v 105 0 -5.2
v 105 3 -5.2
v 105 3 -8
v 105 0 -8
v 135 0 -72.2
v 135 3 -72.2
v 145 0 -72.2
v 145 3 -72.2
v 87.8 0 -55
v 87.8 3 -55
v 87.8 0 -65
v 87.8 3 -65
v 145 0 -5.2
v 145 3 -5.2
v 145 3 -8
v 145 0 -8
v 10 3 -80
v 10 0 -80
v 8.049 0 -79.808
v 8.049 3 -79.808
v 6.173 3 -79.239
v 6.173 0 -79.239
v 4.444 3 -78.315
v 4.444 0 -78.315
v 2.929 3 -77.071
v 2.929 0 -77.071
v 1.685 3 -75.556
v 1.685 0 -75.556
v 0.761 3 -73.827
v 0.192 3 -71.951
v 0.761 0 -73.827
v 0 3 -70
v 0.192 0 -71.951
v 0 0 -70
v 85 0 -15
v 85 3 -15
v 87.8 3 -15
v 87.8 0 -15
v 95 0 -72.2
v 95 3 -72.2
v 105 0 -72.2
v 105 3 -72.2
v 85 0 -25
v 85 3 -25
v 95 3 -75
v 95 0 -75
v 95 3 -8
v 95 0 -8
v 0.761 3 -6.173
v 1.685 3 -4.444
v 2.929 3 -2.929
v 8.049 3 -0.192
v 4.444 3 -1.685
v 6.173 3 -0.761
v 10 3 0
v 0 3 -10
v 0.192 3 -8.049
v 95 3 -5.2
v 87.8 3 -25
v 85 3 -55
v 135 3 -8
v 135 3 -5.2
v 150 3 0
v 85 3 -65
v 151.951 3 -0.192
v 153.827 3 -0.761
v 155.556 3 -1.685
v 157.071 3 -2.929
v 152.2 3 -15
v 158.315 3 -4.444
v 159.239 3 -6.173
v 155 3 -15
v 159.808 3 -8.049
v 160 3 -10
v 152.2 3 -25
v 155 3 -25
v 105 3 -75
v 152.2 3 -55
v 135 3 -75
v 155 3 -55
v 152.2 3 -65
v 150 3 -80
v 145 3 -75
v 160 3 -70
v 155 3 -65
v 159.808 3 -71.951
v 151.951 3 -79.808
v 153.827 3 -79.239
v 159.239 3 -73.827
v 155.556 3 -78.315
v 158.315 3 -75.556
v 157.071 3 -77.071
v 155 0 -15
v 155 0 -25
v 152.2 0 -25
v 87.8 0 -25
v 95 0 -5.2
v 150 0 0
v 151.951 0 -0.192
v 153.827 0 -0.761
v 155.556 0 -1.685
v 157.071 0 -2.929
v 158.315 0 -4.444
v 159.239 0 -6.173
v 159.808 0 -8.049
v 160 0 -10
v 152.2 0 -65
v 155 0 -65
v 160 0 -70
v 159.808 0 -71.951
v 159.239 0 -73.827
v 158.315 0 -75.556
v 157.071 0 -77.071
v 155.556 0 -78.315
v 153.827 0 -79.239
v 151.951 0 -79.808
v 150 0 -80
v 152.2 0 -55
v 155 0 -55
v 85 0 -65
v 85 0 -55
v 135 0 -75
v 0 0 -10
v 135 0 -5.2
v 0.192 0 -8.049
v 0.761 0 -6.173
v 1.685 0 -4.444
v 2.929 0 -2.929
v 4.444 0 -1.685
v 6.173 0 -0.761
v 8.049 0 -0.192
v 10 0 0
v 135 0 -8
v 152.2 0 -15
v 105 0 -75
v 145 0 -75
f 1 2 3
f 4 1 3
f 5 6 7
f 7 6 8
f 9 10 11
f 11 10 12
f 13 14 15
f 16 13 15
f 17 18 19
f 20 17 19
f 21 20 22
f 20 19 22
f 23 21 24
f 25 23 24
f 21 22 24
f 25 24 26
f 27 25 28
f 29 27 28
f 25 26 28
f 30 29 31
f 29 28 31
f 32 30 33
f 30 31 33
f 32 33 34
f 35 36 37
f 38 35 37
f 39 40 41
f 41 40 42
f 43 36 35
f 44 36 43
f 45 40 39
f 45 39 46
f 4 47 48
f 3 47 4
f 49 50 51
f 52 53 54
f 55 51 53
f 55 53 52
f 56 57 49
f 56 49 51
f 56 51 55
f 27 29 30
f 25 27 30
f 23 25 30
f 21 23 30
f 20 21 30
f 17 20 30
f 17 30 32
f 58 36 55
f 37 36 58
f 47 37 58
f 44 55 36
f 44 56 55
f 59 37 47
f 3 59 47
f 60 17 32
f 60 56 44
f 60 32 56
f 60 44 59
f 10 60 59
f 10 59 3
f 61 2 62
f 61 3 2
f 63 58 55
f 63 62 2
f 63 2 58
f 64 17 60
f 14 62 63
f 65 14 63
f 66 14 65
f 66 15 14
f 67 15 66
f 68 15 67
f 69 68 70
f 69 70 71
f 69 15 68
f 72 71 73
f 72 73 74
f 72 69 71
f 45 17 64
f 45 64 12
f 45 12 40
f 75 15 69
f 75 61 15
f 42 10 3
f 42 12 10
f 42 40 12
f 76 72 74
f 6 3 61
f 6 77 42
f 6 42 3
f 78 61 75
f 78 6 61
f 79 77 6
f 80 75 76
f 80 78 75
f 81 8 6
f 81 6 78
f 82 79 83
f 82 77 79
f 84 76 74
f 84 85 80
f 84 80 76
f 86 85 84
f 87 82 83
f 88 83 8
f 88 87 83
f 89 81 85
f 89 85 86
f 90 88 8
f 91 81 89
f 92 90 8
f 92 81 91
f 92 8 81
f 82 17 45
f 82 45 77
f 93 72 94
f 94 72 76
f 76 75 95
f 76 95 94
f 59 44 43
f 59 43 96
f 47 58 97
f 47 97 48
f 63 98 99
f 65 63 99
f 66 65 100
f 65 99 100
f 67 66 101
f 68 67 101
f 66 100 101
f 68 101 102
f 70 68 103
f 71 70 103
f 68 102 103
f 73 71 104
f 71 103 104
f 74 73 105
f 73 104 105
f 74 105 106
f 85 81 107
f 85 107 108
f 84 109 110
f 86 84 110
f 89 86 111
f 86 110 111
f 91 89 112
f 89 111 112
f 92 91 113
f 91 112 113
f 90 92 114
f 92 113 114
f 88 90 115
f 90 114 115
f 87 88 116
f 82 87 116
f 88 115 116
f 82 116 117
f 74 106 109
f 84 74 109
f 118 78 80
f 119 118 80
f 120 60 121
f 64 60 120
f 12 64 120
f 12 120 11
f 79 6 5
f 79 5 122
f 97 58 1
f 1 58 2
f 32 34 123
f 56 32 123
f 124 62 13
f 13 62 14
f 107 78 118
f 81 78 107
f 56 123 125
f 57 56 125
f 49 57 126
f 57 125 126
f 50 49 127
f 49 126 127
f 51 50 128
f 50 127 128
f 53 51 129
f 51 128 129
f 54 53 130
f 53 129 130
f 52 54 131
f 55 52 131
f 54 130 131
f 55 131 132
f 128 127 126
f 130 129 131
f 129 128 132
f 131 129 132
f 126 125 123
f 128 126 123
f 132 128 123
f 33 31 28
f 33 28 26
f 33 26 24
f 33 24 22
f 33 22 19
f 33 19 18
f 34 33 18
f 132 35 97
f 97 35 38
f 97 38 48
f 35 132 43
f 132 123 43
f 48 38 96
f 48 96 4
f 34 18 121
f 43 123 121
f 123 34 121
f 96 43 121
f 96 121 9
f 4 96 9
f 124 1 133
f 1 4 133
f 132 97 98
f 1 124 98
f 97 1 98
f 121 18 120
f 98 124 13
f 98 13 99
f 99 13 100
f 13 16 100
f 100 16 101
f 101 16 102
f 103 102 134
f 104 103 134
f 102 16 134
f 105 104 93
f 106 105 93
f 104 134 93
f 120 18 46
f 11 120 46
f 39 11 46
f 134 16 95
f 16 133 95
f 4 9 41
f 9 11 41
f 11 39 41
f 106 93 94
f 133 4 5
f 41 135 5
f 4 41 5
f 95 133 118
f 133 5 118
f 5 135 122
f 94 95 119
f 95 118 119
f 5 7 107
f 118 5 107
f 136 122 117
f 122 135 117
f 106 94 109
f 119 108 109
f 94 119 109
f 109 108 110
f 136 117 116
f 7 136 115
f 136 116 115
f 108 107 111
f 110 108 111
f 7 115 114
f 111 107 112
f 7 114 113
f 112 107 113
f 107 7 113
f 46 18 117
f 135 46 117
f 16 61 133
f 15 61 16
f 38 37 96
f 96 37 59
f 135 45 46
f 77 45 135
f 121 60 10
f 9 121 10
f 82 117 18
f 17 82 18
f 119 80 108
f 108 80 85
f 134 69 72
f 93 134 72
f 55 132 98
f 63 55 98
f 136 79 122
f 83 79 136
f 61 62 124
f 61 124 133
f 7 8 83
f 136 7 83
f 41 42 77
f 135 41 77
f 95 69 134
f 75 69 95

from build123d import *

# Parameters (mm, degrees)
BOSS_EXTRU_1_DEPTH      = 3
ESQUISSE4_W             = 10
ESQUISSE4_H             = 2.8
ENL_V_MAT_EXTRU_2_DEPTH = 179.910592196
ESQUISSE5_W             = 2.8
ESQUISSE5_H             = 10
ENL_V_MAT_EXTRU_3_DEPTH = 179.910592196


with BuildPart() as part:
    # Esquisse2 → Boss.-Extru.1 (new body)
    with BuildSketch(Plane(origin=(0, 0, 0), x_dir=(1, 0, 0), z_dir=(0, 1, 0))):
        with BuildLine():
            Line((10, 0), (150, 0))
            ThreePointArc((150, 0), (157.071067812, 2.928932188), (160, 10))
            Line((160, 10), (160, 70))
            ThreePointArc((160, 70), (157.071067812, 77.071067812), (150, 80))
            Line((150, 80), (10, 80))
            ThreePointArc((10, 80), (2.928932188, 77.071067812), (0, 70))
            Line((0, 70), (0, 10))
            ThreePointArc((0, 10), (2.928932188, 2.928932188), (10, 0))
        make_face()
    extrude(amount=BOSS_EXTRU_1_DEPTH)

    # Esquisse4 → Enlèv. mat.-Extru.2 (cut, through all)
    with BuildSketch(Plane(origin=(0, 3, 0), x_dir=(1, 0, 0), z_dir=(0, 1, 0))):
        with Locations((140, 73.6)):
            Rectangle(ESQUISSE4_W, ESQUISSE4_H)
        with Locations((100, 73.6)):
            Rectangle(ESQUISSE4_W, ESQUISSE4_H)
        with Locations((100, 6.6)):
            Rectangle(ESQUISSE4_W, ESQUISSE4_H)
        with Locations((140, 6.6)):
            Rectangle(ESQUISSE4_W, ESQUISSE4_H)
    extrude(amount=-ENL_V_MAT_EXTRU_2_DEPTH, mode=Mode.SUBTRACT)

    # Esquisse5 → Enlèv. mat.-Extru.3 (cut, through all)
    with BuildSketch(Plane(origin=(0, 3, 0), x_dir=(1, 0, 0), z_dir=(0, 1, 0))):
        with Locations((153.6, 60)):
            Rectangle(ESQUISSE5_W, ESQUISSE5_H)
        with Locations((86.4, 60)):
            Rectangle(ESQUISSE5_W, ESQUISSE5_H)
        with Locations((86.4, 20)):
            Rectangle(ESQUISSE5_W, ESQUISSE5_H)
        with Locations((153.6, 20)):
            Rectangle(ESQUISSE5_W, ESQUISSE5_H)
    extrude(amount=-ENL_V_MAT_EXTRU_3_DEPTH, mode=Mode.SUBTRACT)


solid = part.part
